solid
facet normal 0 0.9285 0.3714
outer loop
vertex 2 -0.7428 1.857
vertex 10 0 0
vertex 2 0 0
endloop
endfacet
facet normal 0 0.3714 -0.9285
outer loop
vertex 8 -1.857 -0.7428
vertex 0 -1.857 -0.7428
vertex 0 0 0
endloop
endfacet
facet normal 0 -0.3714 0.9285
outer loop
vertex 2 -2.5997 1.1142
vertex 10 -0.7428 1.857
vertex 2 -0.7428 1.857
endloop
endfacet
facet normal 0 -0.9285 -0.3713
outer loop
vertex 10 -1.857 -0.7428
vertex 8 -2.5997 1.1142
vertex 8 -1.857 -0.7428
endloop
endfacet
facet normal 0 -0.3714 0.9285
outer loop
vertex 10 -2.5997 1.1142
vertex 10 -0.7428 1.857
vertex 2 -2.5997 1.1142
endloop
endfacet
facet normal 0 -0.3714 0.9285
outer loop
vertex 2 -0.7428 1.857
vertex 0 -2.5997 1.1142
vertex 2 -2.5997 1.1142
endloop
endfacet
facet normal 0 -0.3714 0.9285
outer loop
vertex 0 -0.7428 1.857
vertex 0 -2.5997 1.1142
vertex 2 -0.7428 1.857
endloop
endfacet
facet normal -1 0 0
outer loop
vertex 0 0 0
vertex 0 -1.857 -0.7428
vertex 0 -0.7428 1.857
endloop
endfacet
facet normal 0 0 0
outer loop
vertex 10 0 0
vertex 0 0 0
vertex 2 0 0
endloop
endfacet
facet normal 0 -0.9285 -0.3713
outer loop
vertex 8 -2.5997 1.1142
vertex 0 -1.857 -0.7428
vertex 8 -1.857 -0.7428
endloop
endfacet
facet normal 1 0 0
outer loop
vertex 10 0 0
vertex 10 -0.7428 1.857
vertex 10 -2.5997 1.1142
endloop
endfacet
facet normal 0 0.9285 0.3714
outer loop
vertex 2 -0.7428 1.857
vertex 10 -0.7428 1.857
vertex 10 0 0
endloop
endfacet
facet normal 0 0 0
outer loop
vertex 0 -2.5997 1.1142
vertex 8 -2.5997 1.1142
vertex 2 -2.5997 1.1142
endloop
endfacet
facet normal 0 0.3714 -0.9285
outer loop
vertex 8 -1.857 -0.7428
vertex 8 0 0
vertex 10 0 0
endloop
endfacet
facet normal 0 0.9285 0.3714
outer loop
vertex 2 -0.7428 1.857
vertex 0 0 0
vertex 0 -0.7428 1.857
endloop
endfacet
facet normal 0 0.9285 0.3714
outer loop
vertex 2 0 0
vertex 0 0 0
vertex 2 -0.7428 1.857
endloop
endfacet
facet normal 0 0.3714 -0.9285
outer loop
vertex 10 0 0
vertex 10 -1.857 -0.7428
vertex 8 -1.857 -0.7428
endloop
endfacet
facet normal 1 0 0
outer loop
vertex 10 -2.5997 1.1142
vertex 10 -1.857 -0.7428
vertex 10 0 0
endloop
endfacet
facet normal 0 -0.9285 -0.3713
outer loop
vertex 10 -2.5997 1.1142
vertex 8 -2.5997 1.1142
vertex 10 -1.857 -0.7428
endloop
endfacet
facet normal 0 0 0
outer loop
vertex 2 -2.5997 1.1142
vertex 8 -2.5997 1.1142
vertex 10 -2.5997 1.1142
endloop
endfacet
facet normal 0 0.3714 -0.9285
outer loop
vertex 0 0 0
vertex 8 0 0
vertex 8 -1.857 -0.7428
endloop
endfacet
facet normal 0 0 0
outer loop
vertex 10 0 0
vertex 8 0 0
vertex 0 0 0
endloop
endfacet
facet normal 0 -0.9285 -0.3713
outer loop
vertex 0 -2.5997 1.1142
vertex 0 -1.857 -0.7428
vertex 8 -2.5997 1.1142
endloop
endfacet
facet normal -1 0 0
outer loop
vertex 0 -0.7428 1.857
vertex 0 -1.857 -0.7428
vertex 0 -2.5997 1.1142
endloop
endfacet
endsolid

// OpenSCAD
$fn=7;
hull()
{
	translate([0,0,0])
	{
		rotate(164.63087,[-0.7006402,0.13493097,-0.70064026])
		{
			cube([2,2,2]);
		}
	}
	translate([8,-0.00000012987203,0.00000032468003])
	{
		rotate(164.63087,[-0.7006402,0.13493097,-0.70064026])
		{
			cube([2,2,2]);
		}
	}
}
